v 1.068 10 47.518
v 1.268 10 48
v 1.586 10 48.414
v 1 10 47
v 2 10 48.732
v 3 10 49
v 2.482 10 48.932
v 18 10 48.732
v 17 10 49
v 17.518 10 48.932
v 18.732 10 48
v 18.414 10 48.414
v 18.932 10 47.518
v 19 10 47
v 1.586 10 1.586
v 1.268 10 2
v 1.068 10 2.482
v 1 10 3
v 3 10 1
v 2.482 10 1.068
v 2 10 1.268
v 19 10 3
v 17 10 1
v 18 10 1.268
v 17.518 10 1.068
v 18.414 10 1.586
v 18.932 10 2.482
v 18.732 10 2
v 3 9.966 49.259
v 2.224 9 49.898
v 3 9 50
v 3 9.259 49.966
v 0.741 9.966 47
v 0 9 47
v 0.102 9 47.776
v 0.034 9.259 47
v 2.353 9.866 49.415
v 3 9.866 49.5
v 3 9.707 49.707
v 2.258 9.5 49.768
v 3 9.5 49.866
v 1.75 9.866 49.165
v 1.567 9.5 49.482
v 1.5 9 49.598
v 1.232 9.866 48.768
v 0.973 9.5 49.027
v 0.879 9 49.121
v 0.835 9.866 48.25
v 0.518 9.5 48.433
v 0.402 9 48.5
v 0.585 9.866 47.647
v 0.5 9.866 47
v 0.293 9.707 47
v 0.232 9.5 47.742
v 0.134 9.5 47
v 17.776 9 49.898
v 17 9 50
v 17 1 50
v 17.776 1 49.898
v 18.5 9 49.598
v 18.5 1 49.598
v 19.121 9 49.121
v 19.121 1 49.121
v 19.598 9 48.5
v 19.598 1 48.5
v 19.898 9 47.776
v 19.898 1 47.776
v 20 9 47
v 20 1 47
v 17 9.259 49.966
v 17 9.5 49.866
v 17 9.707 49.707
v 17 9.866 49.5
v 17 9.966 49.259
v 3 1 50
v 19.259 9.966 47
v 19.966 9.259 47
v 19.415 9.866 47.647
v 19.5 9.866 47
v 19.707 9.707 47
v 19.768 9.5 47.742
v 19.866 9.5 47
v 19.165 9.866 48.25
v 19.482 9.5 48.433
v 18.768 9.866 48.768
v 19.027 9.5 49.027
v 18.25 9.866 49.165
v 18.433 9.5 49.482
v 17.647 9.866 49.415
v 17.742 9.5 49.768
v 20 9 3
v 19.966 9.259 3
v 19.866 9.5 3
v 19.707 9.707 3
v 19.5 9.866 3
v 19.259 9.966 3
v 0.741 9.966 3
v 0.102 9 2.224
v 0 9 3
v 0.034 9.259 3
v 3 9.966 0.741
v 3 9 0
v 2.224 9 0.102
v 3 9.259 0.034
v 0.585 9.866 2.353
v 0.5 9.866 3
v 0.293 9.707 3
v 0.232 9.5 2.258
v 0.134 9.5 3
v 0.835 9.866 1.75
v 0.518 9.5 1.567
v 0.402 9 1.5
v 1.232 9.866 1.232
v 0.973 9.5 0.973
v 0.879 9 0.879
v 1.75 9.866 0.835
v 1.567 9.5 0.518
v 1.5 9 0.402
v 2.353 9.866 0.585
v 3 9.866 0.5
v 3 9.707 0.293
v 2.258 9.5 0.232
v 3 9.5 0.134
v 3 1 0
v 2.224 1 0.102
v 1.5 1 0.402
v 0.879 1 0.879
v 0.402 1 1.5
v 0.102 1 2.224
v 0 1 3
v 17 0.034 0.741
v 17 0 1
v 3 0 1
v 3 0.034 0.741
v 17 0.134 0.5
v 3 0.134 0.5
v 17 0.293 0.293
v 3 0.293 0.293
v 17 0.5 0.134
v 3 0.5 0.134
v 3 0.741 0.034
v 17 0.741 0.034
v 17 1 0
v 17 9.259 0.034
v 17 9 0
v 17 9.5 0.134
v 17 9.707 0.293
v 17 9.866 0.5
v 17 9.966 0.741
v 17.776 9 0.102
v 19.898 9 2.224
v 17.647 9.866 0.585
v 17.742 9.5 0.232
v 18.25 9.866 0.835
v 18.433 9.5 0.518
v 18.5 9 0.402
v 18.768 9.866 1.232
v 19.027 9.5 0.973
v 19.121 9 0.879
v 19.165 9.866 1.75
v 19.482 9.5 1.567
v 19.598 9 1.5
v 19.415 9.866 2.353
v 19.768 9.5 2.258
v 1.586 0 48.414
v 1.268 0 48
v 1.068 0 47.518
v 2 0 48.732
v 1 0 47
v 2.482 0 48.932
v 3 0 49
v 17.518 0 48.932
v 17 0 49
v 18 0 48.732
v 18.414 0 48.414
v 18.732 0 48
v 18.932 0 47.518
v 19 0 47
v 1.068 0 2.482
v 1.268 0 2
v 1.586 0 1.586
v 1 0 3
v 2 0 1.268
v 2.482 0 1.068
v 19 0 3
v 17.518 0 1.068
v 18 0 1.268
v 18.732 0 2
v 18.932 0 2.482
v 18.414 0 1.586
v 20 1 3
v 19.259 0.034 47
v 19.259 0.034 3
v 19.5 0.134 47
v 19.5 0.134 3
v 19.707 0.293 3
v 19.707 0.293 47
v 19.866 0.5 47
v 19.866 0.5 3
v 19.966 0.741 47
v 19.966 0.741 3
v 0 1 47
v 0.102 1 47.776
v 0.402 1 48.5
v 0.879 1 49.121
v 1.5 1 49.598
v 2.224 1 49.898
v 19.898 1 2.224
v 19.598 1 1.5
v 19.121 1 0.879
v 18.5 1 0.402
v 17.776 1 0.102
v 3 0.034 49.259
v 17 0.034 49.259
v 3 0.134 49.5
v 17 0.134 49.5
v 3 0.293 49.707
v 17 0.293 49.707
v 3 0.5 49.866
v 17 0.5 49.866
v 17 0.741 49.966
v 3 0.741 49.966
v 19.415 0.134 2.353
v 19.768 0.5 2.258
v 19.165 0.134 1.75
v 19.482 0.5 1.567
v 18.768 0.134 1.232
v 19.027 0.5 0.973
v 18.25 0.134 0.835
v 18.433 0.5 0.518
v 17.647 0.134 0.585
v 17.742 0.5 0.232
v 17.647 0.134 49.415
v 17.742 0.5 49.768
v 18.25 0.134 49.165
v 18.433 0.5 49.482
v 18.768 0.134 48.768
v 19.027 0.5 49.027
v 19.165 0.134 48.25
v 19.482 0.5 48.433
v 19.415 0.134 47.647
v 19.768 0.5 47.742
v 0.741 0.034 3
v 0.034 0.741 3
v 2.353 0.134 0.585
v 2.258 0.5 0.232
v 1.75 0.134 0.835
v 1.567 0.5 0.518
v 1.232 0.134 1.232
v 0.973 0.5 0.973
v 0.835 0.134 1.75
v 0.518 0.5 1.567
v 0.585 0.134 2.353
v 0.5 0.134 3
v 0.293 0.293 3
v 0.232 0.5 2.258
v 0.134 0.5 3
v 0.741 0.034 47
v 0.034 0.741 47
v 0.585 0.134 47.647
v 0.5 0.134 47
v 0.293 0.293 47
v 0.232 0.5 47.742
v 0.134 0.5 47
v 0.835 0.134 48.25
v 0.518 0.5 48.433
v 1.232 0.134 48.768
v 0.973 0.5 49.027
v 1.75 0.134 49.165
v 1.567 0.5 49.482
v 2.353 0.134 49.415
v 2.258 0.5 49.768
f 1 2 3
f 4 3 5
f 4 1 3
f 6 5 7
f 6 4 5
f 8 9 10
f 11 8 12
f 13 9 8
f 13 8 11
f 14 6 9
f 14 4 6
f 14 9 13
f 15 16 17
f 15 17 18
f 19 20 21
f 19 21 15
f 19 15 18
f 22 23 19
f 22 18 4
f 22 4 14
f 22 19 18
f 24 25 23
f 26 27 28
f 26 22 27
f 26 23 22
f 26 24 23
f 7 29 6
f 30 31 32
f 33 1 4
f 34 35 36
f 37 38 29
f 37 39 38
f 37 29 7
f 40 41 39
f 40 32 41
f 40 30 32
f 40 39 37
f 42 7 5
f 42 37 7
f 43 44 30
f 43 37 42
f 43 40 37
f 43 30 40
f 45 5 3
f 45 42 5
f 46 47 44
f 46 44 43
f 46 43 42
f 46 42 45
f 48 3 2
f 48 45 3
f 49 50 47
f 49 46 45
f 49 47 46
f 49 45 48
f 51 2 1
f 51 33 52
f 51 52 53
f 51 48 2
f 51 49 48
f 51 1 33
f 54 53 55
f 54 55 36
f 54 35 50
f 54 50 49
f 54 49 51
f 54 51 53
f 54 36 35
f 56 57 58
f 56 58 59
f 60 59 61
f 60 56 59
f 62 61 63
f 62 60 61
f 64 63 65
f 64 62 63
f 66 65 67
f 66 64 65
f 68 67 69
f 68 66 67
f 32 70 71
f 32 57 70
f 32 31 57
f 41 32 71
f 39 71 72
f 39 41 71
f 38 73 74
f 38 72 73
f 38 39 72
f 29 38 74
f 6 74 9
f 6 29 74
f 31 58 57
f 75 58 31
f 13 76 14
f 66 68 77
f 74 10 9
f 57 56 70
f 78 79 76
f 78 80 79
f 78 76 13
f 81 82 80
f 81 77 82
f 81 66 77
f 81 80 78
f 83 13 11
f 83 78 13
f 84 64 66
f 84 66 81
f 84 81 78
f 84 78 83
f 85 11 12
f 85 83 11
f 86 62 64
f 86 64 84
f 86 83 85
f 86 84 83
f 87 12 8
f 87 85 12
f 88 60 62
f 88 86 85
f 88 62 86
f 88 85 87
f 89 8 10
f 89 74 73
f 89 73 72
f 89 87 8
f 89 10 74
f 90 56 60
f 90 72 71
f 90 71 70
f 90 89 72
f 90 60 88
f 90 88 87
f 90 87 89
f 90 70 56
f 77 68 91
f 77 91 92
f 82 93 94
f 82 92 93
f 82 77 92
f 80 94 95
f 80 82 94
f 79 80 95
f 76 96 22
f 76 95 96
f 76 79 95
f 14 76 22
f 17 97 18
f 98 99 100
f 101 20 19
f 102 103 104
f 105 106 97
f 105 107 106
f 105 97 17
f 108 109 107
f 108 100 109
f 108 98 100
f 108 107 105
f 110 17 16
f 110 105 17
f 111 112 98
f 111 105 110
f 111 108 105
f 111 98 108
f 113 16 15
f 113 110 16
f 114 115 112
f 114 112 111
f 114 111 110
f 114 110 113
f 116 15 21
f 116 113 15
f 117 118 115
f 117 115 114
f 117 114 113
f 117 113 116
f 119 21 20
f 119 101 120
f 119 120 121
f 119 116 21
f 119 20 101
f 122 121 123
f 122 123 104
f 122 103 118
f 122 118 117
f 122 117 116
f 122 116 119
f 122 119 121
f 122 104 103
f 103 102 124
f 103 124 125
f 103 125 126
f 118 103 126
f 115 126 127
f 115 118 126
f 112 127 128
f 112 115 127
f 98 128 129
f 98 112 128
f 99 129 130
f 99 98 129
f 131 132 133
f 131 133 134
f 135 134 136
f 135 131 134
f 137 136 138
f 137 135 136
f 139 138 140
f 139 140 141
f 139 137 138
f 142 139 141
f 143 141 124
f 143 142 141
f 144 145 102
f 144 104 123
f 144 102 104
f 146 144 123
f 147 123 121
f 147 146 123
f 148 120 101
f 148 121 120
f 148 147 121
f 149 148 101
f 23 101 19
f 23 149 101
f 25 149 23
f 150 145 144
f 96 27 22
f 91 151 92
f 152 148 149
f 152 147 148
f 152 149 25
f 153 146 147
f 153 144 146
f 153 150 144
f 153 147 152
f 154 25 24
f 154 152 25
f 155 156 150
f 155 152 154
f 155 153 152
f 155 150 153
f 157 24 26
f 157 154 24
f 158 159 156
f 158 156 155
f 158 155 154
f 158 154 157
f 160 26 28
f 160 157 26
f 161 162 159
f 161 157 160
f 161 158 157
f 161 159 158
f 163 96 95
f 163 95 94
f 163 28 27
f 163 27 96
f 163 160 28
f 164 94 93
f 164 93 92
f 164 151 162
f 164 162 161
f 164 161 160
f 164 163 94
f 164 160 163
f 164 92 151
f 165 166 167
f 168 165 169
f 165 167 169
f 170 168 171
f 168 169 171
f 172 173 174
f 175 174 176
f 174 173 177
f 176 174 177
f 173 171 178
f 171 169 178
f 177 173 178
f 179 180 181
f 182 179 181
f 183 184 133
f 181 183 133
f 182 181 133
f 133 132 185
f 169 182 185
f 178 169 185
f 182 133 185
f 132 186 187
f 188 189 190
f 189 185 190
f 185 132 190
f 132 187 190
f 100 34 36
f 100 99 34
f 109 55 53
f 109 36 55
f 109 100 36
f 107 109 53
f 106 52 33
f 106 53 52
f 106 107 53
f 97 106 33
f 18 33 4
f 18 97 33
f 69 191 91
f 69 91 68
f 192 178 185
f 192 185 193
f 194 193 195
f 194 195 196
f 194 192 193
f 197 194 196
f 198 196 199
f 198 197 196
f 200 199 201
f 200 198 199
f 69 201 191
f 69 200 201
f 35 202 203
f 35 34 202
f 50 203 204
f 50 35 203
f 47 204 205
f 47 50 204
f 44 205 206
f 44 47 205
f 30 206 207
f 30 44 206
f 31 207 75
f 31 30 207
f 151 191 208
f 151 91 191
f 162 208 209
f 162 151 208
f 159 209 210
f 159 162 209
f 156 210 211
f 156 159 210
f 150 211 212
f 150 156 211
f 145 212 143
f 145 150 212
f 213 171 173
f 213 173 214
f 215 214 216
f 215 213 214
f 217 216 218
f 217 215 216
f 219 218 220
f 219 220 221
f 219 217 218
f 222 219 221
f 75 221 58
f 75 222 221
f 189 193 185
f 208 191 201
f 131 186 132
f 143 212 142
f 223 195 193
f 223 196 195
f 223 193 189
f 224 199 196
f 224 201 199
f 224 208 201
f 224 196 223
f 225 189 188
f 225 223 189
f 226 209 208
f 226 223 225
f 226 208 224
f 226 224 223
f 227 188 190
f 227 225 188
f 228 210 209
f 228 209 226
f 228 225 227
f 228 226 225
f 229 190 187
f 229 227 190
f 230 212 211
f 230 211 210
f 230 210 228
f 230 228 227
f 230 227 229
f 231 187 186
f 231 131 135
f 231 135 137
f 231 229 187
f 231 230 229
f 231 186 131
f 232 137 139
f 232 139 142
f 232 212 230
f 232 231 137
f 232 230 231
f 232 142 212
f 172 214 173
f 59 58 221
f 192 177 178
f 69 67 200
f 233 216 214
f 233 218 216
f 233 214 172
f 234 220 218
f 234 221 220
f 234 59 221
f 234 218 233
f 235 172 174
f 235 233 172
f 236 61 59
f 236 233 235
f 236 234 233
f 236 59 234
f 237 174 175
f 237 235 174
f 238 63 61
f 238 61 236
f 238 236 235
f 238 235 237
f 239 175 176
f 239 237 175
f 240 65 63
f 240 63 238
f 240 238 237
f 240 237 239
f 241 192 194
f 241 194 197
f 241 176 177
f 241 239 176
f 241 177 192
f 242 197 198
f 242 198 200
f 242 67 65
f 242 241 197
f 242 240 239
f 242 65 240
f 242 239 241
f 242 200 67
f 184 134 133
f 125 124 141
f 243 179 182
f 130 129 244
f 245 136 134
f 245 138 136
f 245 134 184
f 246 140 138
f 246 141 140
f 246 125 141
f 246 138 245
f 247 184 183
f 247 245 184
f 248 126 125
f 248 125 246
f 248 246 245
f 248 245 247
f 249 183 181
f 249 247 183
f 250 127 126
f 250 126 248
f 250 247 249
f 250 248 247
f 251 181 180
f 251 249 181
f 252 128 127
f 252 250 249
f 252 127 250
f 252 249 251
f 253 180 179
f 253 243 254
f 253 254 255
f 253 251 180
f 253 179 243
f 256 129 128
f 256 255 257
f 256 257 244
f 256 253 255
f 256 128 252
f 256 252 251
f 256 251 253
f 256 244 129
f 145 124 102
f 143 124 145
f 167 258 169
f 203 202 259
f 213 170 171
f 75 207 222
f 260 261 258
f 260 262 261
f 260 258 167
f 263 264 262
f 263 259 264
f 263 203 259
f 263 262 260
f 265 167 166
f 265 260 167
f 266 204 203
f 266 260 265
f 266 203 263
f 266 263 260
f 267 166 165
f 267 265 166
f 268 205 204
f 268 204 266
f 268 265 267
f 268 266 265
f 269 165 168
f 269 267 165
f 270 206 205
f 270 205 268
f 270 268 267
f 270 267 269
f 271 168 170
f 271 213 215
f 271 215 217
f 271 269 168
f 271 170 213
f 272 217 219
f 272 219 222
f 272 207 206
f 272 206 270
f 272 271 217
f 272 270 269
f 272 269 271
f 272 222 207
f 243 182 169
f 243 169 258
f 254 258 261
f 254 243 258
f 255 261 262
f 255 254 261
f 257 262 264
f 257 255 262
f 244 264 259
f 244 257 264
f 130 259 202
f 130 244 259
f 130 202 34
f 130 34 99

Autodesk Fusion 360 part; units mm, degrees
sketch "Sketch1" plane through (0, 0, 0) normal (0, 1, 0) x (1, 0, 0)
  line L0 (0, 0) -> (20, 0)
  line L1 (20, 0) -> (20, -50)
  line L2 (20, -50) -> (0, -50)
  line L3 (0, -50) -> (0, 0)
  dimension "d1" = 20
  dimension "d2" = 50
extrude "Extrude1" add sketch "Sketch1" along normal blind 10
fillet "Fillet1" radius 3 4 edges at (20, 5, 50) (0, 5, 50) (0, 5, 0) (20, 5, 0)
fillet "Fillet1" radius 1 2 faces at (6.6667, 10, 16.6667) (6.6667, 0, 16.6667)
